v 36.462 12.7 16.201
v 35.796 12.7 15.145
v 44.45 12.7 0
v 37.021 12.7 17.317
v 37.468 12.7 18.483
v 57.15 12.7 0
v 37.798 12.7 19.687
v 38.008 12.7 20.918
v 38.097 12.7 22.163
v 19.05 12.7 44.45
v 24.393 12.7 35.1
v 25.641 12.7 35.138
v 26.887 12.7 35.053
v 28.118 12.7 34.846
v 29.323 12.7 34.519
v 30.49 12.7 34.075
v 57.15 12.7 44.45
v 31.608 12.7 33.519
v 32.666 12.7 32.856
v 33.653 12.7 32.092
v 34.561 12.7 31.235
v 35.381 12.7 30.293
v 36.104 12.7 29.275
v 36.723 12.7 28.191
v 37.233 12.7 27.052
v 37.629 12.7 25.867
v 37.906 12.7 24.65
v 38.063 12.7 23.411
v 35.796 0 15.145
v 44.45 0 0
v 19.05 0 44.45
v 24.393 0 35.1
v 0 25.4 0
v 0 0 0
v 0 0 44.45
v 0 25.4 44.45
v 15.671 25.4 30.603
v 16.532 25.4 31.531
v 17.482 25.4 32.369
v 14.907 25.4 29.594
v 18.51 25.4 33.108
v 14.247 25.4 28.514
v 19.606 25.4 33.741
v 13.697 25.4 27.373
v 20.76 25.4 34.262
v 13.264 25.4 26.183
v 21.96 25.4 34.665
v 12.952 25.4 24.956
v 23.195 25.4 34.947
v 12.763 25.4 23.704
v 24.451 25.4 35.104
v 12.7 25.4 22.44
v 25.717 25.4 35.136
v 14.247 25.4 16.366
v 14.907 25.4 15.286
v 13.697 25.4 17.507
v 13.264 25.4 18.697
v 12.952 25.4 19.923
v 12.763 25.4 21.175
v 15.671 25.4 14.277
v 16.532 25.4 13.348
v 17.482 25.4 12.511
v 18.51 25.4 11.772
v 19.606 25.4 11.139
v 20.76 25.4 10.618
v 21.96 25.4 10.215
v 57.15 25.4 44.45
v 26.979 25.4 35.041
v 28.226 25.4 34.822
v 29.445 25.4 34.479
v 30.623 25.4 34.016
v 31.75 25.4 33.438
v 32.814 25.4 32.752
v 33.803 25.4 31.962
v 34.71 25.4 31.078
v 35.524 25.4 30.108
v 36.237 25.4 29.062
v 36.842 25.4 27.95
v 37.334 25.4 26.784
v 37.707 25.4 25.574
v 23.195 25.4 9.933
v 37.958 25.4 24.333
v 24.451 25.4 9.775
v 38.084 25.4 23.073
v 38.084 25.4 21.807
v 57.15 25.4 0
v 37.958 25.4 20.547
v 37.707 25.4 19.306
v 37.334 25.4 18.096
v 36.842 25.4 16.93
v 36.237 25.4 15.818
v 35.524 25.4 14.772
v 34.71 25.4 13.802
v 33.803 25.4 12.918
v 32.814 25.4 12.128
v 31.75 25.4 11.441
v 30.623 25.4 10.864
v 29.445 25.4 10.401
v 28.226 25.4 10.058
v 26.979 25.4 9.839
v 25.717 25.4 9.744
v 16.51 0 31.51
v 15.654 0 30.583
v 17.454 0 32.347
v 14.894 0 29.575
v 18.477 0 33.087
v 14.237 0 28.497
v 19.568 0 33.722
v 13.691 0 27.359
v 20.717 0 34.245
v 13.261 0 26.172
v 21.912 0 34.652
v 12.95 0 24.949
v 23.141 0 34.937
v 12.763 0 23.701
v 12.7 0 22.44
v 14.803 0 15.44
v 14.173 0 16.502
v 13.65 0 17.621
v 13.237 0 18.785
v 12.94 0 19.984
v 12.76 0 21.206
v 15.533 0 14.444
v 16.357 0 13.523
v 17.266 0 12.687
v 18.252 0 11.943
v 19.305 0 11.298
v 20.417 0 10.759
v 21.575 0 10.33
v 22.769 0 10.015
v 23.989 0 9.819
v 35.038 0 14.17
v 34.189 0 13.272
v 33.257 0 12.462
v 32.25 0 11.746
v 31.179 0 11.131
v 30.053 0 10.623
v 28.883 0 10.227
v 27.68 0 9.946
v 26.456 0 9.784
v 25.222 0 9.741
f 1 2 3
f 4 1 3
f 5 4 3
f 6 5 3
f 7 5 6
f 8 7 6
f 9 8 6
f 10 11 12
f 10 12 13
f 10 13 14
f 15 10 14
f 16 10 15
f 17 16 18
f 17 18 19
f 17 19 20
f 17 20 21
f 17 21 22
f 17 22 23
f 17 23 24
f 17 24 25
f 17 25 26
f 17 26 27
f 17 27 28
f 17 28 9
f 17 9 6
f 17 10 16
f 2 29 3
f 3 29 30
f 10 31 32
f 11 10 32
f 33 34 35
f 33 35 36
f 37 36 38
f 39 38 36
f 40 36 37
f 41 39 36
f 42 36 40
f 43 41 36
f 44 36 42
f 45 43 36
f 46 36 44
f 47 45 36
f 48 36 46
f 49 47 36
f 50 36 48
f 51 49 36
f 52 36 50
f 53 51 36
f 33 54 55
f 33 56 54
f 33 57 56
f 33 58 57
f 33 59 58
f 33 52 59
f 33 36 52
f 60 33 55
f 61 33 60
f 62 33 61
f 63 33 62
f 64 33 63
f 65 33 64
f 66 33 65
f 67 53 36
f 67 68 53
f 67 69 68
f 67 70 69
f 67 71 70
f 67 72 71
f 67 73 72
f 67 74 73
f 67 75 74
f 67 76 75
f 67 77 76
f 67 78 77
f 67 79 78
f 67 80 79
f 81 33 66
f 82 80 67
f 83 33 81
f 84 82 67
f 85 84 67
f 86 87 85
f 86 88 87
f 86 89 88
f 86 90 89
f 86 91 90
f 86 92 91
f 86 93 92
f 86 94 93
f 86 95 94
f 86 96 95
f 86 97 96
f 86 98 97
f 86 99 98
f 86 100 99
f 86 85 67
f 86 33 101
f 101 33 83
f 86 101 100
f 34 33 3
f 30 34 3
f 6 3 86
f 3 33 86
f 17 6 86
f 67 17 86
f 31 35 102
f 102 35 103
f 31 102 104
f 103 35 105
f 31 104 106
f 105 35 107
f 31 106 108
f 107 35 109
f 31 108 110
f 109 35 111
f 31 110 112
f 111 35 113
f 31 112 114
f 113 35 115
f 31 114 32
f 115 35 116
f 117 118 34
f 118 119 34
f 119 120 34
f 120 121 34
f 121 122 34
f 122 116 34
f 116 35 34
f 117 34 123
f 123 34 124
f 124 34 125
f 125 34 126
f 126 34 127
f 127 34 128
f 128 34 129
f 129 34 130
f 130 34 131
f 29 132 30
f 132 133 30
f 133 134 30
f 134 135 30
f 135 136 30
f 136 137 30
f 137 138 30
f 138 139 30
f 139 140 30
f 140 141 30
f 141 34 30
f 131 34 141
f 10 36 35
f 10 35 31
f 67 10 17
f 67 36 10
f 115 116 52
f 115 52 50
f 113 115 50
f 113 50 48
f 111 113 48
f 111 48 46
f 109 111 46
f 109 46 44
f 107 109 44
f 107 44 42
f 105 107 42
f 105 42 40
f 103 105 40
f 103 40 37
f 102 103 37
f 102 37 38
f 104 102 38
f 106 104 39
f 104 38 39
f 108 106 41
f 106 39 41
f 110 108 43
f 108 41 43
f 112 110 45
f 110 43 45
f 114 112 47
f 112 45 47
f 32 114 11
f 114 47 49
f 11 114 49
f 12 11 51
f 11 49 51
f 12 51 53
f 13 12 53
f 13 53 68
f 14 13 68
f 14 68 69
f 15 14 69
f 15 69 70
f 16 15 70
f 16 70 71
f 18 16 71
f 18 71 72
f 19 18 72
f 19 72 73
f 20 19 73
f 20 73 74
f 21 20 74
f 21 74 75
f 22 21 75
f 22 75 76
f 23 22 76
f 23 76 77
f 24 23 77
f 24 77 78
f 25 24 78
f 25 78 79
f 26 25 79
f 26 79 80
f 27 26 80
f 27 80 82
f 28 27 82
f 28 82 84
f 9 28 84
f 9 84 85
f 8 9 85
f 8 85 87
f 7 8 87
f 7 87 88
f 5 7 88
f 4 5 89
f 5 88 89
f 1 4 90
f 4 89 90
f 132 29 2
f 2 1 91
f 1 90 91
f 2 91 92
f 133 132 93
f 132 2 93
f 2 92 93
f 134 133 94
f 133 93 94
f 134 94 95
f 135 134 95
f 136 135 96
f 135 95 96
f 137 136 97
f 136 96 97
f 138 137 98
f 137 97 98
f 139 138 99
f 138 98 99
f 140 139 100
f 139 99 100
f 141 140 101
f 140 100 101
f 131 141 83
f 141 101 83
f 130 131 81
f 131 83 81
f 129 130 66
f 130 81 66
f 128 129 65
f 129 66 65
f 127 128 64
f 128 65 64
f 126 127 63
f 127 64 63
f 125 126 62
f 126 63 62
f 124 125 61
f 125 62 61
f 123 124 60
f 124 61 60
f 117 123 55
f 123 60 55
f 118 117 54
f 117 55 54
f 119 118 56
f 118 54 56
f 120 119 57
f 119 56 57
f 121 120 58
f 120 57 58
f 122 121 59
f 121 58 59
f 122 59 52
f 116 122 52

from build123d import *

# Parameters (mm, degrees)
F0_W     = 57.15
F0_H     = 25.4
F1_DEPTH = 44.45
F3_DEPTH = 12.7
F4_R     = 12.7
F5_DEPTH = 25.4


with BuildPart() as f1:
    # F0 (on Top) → F1 (new body)
    with BuildSketch(Plane.XY):
        with Locations((28.575, 12.7)):
            Rectangle(F0_W, F0_H)
    extrude(amount=F1_DEPTH)

    # F2 (on face) → F3 (cut)
    with BuildSketch(Plane.XZ):
        Polygon((57.15, 44.45), (19.05, 44.45), (44.45, 0), (57.15, 0), align=None)
    extrude(amount=-F3_DEPTH, mode=Mode.SUBTRACT)

    # F4 (on face) → F5 (cut)
    with BuildSketch(Plane(origin=(0, 25.4, 0), x_dir=(-1, 0, 0), z_dir=(0, 1, 0))):
        with Locations((-25.4, 22.439942)):
            Circle(F4_R)
    extrude(amount=-F5_DEPTH, mode=Mode.SUBTRACT)


solid = f1.part
